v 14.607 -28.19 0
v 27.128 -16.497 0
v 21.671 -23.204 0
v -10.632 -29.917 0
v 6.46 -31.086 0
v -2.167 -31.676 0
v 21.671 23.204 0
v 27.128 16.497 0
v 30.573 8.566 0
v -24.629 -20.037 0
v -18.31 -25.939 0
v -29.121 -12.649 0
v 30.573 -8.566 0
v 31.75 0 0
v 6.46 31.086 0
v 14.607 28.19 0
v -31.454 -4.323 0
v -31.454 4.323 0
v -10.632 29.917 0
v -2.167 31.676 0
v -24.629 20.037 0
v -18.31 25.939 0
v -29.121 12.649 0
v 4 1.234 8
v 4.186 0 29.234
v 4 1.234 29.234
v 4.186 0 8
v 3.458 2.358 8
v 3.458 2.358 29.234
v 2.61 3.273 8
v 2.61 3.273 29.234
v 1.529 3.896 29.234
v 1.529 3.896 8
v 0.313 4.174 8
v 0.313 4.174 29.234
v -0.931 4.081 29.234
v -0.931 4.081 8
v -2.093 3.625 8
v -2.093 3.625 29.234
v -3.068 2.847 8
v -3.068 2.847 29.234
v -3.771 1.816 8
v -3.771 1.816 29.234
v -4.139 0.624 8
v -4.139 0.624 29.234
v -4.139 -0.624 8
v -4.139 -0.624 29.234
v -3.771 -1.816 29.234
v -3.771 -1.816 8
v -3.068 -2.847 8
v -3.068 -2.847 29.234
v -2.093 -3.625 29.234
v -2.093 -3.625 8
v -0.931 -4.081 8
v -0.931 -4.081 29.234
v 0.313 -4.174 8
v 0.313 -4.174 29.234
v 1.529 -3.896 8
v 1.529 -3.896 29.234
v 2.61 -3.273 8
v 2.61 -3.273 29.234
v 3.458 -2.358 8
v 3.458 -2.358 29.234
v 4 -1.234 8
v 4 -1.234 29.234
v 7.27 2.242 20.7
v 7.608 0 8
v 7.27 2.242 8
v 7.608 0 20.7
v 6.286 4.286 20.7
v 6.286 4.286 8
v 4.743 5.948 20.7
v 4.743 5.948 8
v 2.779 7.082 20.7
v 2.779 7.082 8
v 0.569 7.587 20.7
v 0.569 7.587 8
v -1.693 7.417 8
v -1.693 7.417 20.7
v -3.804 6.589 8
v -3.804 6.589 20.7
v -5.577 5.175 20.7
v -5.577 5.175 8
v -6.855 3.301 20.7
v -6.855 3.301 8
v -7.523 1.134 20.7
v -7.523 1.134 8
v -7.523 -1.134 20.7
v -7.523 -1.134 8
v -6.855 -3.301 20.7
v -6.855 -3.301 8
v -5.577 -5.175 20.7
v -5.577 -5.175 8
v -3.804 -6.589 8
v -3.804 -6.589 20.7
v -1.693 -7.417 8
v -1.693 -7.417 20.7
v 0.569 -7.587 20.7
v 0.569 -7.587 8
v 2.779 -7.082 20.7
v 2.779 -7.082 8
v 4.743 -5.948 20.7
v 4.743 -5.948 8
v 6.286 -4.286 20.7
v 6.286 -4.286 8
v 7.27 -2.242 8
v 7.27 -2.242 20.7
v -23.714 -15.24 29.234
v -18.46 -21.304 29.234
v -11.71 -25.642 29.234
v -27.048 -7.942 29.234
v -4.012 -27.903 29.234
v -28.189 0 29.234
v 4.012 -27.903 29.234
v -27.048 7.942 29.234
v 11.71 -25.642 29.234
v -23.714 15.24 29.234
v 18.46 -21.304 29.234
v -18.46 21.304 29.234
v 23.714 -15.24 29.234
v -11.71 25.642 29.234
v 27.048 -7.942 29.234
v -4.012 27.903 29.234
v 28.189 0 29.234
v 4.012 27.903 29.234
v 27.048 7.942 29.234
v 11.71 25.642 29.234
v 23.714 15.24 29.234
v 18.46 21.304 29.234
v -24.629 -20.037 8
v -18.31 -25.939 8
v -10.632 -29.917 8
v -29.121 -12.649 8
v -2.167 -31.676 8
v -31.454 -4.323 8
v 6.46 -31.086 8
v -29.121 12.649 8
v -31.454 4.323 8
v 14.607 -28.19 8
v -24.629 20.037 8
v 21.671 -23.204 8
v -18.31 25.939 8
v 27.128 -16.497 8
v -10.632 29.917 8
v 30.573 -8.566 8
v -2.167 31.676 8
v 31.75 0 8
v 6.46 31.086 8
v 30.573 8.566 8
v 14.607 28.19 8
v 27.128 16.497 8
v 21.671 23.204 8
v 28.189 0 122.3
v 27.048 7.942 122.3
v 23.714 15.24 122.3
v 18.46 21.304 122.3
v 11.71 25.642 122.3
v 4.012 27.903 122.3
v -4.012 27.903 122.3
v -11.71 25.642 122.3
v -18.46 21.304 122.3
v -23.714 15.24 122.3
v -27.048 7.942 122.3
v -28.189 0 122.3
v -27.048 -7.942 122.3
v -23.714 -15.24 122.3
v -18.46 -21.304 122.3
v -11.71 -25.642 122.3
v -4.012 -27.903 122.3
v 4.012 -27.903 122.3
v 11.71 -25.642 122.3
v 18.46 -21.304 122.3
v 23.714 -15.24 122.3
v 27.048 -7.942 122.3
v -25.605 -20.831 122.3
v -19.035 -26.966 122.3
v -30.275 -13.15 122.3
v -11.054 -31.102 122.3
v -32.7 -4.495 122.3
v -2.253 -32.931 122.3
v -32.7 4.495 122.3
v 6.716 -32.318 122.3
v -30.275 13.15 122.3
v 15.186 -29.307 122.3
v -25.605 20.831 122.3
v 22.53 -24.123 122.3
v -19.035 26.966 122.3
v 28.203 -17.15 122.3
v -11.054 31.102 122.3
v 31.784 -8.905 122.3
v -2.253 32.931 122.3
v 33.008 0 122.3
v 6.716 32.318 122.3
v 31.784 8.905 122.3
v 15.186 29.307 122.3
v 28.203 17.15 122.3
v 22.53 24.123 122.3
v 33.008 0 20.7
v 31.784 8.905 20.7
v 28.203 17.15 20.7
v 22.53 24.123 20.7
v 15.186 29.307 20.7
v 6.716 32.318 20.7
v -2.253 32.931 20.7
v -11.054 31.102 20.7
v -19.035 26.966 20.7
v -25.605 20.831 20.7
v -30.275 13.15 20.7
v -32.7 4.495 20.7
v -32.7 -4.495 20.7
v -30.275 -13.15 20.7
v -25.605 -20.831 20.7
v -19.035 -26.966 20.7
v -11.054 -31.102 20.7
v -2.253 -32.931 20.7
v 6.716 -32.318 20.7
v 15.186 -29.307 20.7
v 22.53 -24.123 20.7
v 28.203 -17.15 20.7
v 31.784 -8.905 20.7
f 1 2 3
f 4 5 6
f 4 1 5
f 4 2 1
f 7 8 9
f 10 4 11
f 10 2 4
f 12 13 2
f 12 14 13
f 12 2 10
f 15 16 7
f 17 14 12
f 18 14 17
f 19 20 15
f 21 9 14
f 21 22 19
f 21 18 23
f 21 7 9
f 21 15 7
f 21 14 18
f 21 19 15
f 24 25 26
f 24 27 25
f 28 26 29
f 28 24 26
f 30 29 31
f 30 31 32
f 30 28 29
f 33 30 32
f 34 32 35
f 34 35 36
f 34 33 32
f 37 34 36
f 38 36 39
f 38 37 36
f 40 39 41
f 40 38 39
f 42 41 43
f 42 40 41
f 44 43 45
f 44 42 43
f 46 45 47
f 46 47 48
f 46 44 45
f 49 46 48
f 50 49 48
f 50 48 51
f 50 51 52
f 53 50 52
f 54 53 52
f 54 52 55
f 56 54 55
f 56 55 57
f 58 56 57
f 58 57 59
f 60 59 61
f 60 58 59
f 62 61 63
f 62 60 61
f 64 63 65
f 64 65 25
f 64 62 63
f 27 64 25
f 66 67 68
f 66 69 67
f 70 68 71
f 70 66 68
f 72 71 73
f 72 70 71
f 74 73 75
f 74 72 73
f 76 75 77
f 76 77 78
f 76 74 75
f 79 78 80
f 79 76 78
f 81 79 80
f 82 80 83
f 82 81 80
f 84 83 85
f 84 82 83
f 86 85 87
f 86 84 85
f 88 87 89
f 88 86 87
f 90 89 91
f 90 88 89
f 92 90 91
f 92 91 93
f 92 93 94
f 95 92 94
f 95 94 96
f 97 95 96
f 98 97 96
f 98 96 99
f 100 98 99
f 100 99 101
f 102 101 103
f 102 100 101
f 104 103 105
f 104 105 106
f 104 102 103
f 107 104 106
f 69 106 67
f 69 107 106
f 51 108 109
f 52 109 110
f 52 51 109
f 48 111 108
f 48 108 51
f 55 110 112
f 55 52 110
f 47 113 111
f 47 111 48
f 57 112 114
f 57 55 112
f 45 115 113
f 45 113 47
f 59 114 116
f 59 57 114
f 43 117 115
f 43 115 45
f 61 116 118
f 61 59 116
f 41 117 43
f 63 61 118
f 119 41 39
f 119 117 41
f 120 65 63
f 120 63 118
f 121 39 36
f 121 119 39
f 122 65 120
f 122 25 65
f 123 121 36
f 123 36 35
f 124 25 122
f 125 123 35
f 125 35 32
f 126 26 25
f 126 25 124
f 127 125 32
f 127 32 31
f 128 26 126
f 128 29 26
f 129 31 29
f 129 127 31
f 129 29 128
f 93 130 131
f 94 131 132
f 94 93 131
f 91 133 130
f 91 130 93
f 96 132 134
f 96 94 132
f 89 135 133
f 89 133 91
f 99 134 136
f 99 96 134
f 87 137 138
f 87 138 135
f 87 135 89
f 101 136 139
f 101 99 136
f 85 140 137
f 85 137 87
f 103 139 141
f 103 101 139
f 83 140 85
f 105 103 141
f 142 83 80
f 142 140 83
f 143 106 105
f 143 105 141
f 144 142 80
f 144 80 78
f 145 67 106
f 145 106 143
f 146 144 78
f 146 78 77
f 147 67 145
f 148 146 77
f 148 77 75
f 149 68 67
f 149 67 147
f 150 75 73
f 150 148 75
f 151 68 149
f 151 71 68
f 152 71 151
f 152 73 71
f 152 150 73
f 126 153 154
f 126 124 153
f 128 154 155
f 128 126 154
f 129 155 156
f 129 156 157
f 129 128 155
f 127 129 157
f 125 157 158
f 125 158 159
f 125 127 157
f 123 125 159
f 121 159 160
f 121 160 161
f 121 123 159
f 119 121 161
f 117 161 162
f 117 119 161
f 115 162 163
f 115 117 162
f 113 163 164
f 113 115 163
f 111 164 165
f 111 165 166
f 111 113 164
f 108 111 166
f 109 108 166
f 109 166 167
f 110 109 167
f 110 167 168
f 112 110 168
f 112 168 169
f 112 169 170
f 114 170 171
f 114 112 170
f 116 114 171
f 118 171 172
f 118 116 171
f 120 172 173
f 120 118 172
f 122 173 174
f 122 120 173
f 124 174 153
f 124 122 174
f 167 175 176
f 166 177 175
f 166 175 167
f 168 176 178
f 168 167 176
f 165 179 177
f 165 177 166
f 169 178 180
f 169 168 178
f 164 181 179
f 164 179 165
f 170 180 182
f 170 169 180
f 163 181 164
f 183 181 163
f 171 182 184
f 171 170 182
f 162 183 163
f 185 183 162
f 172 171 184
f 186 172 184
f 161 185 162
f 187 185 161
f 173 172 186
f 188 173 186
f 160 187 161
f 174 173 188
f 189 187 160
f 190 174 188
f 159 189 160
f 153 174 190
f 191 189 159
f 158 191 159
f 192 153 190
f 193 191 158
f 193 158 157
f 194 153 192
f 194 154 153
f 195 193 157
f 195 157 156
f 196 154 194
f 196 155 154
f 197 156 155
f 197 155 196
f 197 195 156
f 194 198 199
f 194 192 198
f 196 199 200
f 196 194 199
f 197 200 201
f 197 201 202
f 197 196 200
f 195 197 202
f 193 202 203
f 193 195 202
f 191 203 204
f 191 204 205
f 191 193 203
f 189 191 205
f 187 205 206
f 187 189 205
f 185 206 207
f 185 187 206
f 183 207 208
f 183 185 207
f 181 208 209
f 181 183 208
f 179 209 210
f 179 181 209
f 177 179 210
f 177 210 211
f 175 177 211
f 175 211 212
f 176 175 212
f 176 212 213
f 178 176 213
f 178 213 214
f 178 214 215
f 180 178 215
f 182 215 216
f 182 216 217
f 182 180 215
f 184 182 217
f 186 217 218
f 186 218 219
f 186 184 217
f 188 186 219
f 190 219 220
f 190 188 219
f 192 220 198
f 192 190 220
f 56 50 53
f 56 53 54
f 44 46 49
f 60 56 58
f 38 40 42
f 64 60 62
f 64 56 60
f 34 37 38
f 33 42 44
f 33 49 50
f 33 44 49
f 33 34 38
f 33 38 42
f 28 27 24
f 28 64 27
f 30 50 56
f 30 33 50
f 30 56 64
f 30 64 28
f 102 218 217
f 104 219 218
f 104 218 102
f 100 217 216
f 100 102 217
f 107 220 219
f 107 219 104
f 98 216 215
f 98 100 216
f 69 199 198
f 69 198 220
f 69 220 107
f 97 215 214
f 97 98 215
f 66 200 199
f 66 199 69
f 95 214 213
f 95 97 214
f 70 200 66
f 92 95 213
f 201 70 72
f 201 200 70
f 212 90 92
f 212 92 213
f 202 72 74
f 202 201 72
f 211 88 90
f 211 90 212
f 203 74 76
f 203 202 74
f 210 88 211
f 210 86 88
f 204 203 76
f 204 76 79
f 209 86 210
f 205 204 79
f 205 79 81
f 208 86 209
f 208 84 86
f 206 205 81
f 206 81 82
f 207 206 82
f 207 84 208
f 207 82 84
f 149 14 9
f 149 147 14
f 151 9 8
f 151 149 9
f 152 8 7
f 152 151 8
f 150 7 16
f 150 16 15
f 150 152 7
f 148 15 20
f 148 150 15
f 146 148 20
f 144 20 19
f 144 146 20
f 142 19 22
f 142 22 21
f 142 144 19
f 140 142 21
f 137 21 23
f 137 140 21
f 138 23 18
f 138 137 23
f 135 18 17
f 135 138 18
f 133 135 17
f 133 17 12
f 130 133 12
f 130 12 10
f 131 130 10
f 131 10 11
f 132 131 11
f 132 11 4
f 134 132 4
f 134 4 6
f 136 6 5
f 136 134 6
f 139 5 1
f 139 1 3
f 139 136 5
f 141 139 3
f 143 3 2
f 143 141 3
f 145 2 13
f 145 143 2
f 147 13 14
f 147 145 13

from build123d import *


with BuildPart() as f1:
    # F0 (on Front) → F1 (revolve)
    with BuildSketch(Plane.XZ):
        Polygon((0, 8), (0, 0), (31.75, 0), (31.75, 8), (7.607925, 8), (4.185817, 8), align=None)
        Polygon((4.185817, 29.234255), (4.185817, 8), (7.607925, 8), (7.607925, 20.7), (33.007925, 20.7), (33.007925, 122.3), (28.189454, 122.3), (28.189454, 29.234255), align=None)
    revolve(axis=Axis((0, 0, 4), (0, 0, 1)))


solid = f1.part
